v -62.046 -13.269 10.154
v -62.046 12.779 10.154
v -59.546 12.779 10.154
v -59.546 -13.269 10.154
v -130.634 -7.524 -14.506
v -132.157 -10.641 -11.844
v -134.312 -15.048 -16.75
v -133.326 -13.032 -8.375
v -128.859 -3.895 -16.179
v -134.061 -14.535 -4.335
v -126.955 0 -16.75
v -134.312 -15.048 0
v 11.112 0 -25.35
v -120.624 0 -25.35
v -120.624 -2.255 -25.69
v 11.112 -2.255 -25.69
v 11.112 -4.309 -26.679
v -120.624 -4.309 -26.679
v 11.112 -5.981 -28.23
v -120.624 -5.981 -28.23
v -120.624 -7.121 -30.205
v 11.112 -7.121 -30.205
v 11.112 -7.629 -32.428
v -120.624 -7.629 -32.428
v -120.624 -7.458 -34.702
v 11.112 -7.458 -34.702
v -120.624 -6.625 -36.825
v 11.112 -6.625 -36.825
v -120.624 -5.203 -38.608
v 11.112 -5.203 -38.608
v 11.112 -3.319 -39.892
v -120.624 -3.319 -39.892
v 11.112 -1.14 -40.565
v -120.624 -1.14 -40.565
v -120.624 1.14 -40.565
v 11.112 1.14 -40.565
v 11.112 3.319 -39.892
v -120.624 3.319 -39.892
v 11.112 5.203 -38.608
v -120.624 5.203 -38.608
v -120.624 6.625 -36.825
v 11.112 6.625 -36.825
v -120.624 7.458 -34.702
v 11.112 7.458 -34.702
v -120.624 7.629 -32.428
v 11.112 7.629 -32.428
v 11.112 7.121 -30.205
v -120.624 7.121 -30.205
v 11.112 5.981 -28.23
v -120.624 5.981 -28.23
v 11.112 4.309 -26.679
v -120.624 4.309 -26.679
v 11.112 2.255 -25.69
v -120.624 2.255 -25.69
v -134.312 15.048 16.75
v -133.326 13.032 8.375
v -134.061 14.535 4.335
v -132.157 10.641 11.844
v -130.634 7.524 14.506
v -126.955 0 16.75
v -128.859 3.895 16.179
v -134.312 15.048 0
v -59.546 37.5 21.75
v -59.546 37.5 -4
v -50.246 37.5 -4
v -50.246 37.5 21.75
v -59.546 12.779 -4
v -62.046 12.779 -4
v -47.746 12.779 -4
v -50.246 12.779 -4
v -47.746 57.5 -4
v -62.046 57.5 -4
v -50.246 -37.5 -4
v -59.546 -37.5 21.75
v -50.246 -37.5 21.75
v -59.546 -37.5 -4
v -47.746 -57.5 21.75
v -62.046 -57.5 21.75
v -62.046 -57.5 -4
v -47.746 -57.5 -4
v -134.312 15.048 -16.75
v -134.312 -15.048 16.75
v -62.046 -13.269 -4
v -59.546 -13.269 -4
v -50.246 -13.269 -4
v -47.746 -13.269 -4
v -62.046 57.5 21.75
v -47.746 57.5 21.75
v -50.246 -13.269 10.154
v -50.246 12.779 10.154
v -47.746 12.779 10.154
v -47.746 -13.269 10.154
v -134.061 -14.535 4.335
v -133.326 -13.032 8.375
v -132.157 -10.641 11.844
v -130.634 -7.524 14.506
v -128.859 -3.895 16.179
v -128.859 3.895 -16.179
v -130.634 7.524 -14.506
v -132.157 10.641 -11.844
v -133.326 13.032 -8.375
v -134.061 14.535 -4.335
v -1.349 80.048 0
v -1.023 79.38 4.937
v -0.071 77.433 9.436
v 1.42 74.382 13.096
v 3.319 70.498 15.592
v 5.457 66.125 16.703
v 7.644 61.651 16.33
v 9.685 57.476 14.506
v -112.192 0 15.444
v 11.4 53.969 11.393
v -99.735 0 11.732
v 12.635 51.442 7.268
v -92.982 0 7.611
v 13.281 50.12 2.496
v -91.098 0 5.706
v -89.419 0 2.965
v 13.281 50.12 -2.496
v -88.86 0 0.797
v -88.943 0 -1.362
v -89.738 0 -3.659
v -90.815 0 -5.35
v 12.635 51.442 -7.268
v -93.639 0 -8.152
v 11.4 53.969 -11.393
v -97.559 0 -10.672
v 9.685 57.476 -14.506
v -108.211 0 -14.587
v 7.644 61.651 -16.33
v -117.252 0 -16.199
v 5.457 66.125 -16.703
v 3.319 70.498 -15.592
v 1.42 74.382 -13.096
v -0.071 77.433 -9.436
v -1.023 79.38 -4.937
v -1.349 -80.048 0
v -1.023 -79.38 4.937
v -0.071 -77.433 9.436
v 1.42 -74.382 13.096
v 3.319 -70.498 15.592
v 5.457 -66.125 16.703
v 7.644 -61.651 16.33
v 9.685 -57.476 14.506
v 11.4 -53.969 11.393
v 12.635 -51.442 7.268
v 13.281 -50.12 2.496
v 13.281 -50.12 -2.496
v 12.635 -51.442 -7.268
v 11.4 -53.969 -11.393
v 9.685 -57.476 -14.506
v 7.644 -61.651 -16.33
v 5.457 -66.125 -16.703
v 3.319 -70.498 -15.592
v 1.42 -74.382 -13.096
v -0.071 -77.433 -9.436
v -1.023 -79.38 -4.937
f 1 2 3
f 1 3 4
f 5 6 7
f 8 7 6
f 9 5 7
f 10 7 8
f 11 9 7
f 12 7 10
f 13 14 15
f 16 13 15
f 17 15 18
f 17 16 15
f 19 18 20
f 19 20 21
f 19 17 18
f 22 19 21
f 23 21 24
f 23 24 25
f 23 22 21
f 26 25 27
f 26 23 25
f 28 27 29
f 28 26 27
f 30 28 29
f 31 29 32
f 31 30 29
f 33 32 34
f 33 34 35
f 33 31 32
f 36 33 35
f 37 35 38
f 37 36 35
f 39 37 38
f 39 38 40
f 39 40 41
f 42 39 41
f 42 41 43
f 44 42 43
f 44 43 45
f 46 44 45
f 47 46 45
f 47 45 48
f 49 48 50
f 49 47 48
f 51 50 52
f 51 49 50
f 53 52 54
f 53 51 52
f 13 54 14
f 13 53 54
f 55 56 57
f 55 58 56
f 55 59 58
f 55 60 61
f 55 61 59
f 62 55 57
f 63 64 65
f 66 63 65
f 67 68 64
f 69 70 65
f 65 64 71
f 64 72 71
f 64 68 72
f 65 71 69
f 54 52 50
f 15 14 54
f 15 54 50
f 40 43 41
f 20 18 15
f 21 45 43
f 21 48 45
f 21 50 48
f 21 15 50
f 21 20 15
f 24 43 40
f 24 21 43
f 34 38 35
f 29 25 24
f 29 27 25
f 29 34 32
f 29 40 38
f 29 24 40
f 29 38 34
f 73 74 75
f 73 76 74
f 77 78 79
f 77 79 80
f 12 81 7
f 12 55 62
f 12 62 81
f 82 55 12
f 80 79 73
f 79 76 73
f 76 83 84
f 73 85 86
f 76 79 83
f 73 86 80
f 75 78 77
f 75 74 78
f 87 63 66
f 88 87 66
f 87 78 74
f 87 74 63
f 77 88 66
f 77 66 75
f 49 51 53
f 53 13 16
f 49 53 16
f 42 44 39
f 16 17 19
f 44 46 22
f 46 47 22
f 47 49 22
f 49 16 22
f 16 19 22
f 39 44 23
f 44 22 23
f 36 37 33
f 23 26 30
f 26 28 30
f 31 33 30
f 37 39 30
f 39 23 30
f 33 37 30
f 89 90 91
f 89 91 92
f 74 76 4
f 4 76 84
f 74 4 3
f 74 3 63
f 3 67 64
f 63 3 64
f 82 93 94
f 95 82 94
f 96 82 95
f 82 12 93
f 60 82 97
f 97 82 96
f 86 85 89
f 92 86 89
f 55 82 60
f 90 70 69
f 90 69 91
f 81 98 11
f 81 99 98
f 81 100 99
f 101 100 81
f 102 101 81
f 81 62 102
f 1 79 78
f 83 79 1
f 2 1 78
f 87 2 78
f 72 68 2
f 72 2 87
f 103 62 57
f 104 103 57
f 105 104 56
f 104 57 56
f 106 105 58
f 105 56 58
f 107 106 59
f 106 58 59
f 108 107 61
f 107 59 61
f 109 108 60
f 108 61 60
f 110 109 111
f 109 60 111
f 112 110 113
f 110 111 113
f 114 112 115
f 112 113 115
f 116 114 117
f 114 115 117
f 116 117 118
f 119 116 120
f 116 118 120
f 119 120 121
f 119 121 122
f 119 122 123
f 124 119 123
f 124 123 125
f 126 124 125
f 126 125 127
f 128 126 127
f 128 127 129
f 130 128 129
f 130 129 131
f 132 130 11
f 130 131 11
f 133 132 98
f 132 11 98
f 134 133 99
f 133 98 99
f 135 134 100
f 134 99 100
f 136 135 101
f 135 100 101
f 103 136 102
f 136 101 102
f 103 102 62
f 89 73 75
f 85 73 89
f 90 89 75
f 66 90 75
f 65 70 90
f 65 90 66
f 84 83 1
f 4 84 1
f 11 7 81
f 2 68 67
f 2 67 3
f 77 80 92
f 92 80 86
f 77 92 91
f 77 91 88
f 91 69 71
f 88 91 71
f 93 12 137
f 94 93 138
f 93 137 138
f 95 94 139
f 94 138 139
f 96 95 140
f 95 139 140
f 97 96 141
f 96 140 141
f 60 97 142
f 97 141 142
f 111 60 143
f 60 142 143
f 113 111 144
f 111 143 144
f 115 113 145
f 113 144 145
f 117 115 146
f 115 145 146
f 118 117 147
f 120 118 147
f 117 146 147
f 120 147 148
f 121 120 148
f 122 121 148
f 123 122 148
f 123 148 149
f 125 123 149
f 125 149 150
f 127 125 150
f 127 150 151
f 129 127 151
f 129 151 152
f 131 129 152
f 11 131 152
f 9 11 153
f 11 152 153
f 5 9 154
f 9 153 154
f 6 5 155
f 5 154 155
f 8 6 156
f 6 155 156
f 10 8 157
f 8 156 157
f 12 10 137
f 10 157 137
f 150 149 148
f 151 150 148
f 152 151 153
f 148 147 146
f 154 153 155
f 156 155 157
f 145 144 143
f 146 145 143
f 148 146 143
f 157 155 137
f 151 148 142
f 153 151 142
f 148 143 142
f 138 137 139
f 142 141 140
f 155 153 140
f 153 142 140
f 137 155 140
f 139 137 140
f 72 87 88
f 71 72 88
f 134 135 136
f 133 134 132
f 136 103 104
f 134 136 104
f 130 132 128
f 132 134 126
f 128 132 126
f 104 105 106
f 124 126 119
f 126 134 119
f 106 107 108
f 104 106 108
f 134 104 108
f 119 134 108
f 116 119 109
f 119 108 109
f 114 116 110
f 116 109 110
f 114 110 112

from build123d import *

# Parameters (mm, degrees)
F3_DEPTH = 16.75
F4_W     = 14.3
F4_H     = 115
F4_W_2   = 9.3
F4_H_2   = 75
F5_DEPTH = 20.75
F6_DEPTH = 5
F7_W     = 26.0475566859
F7_H     = 14.153759297
F8_DEPTH = 25
F9_W     = 131.7364319801
F9_H     = 7.65


# Not quite as in the source:
# - a feature of the source that left no trace in its solid (it failed there, or was rolled back) is left out


with BuildPart() as f1:
    # F0 (on Top) → F1 (revolve)
    with BuildSketch(Plane.XY):
        Polygon((-134.3117827935, 15.0481095387), (-126.9553638746, 0), (-50.2462865474, 37.5), (6.0070368258, 65), (-1.3493820931, 80.0481095387), align=None)
    revolve(axis=Axis((-60.4741635244, 32.5, 0), (0.8983945993, 0.4391891892, 0)))

    # F0 (on Top) → F2 (revolve)
    with BuildSketch(Plane.XY):
        Polygon((-50.2462865474, -37.5), (-126.9553638746, 0), (-134.3117827935, -15.0481095387), (-1.3493820931, -80.0481095387), (6.0070368258, -65), align=None)
    revolve(axis=Axis((-60.4741635244, -32.5, 0), (-0.8983945993, 0.4391891892, 0)))

    # F0 (on Top) → F3 (join, symmetric)
    with BuildSketch(Plane.XY):
        Polygon((-134.3117827935, -15.0481095387), (-126.9553638746, 0), (-134.3117827935, 15.0481095387), align=None)
    extrude(amount=F3_DEPTH, both=True)


with BuildPart() as f5:
    # F4 (on face) → F5 (new body)
    with BuildSketch(Plane.XY.offset(16.75)):
        with Locations((-54.8962865474, 0)):
            Rectangle(F4_W, F4_H)
        with Locations((-54.8962865474, 0)):
            Rectangle(F4_W_2, F4_H_2, mode=Mode.SUBTRACT)
    extrude(amount=-F5_DEPTH)

    # F4 (on face) → F6 (join)
    with BuildSketch(Plane.XY.offset(16.75)):
        with Locations((-54.8962865474, 0)):
            Rectangle(F4_W, F4_H)
        with Locations((-54.8962865474, 0)):
            Rectangle(F4_W_2, F4_H_2, mode=Mode.SUBTRACT)
    extrude(amount=F6_DEPTH)

    # F7 (on face) → F8 (cut)
    with BuildSketch(Plane(origin=(-62.0462865474, 0, 0), x_dir=(0, -1, 0), z_dir=(-1, 0, 0))):
        with Locations((0.2447417813, 3.0768796485)):
            Rectangle(F7_W, F7_H)
    extrude(amount=-F8_DEPTH, mode=Mode.SUBTRACT)


with BuildPart() as f10:
    # F9 (on Front) → F10 (revolve)
    with BuildSketch(Plane.XZ):
        with Locations((-54.7559685074, -29.175)):
            Rectangle(F9_W, F9_H)
    revolve(axis=Axis((-54.7559685074, 0, -33), (1, 0, 0)))


solid = Compound([f1.part, f5.part, f10.part])
